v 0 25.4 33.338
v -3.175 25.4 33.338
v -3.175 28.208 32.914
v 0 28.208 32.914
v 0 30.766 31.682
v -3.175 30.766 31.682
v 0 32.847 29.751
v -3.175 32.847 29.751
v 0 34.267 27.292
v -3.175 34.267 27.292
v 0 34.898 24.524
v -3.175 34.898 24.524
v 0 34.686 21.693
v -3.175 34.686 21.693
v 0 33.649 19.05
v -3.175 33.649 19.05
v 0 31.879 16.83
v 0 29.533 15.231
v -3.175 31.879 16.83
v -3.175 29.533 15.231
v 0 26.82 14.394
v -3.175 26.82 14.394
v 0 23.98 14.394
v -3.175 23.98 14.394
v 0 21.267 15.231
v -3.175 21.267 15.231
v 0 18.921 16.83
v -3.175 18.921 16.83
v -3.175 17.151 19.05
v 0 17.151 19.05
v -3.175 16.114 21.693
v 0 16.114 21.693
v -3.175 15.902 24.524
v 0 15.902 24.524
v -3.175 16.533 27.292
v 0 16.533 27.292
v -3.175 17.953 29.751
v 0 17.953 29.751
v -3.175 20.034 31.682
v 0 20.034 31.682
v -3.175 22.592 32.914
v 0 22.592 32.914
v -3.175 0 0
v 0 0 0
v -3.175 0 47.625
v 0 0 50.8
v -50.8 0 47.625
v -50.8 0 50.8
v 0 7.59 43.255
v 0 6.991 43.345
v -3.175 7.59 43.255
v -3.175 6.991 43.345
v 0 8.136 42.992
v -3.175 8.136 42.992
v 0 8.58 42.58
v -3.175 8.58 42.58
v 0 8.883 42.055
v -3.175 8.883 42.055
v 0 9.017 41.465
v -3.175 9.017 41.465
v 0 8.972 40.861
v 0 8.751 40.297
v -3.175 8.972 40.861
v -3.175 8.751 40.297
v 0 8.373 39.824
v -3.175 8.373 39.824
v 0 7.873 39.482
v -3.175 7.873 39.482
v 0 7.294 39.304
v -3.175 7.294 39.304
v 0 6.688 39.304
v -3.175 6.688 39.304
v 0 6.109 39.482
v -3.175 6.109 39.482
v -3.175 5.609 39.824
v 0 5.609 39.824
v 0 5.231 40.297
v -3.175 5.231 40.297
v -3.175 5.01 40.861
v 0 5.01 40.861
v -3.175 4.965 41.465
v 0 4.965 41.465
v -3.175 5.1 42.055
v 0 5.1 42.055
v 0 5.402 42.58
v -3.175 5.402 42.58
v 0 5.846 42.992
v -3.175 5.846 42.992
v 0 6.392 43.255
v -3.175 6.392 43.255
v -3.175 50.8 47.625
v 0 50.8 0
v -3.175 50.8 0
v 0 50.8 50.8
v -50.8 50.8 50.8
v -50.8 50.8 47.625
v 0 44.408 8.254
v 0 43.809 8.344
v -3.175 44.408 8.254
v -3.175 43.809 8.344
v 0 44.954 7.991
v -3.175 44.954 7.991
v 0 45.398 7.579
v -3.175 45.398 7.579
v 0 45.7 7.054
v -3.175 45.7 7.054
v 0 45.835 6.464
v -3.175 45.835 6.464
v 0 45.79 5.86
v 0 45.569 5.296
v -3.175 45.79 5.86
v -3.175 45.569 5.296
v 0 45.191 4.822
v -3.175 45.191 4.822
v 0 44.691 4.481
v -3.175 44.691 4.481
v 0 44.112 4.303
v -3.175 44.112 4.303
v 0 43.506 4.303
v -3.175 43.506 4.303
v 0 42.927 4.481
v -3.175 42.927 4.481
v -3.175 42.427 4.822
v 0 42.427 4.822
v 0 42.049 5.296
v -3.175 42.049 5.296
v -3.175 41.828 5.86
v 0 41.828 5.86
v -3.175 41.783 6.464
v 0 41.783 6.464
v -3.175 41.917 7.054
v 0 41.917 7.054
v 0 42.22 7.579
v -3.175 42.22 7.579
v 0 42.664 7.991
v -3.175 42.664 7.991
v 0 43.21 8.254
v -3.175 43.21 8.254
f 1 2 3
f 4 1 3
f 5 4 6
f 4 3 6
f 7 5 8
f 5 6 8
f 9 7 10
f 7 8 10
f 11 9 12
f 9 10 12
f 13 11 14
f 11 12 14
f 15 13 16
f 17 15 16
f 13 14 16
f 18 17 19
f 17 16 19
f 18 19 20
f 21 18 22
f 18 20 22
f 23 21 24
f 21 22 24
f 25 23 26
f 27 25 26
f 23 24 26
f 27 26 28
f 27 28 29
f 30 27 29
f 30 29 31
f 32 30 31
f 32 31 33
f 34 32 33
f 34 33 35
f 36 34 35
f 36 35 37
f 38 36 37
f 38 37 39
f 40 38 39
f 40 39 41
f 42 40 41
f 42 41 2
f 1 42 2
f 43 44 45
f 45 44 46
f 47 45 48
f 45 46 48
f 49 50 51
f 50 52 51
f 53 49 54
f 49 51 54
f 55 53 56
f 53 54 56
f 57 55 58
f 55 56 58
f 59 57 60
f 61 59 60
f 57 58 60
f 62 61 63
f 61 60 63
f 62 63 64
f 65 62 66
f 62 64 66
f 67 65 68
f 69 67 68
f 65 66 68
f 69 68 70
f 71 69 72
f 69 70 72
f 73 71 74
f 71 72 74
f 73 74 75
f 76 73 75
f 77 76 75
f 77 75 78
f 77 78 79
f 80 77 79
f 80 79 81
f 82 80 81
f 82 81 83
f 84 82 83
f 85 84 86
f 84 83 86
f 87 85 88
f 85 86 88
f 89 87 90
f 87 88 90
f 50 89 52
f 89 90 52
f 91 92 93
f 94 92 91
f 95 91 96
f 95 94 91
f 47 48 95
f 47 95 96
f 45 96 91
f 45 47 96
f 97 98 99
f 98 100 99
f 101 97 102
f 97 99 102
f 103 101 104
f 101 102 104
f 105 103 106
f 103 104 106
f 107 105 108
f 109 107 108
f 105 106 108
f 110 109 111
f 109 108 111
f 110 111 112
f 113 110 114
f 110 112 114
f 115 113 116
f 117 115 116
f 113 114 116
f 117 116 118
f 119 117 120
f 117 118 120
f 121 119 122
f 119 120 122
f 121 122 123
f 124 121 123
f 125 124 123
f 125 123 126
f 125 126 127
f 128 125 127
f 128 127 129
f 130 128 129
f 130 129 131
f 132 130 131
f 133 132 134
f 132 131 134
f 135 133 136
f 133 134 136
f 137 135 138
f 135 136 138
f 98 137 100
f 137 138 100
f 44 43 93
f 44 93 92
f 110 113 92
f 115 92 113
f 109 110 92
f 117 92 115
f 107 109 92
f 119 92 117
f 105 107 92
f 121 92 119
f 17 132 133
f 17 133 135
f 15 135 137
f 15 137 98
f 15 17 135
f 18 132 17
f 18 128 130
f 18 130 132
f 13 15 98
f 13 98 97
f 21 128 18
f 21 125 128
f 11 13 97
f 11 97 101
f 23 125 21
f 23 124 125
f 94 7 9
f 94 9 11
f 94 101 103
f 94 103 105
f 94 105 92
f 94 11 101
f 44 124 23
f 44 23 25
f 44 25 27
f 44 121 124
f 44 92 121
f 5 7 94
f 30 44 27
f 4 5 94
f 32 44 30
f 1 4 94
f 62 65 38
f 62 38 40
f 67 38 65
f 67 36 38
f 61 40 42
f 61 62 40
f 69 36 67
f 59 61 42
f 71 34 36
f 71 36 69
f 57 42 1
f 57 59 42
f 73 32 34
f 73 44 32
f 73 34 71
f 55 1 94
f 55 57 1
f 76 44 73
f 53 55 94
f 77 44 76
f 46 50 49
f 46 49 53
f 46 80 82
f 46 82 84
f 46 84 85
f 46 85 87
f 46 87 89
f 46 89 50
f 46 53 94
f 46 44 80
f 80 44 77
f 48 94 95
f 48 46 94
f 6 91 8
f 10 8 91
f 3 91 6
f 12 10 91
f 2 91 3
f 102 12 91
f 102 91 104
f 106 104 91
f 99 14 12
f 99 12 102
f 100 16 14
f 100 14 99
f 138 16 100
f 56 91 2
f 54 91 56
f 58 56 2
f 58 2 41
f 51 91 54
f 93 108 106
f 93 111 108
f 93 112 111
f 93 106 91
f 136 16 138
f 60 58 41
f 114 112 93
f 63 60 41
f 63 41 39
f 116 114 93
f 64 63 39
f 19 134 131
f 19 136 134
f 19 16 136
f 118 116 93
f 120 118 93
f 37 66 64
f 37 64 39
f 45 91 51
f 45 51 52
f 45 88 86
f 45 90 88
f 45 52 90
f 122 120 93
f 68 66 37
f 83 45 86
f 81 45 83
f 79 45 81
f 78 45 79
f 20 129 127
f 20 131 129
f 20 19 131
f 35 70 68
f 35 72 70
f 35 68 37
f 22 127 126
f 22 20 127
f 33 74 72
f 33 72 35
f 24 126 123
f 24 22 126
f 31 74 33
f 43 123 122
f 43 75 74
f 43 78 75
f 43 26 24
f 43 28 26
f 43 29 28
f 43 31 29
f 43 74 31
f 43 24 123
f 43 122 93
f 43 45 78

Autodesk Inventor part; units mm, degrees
ref_plane "YZ Plane" through (0, 0, 0) normal (1, 0, 0) x (0, 1, 0)
ref_plane "XZ Plane" through (0, 0, 0) normal (0, 1, 0) x (-1, 0, 0)
ref_plane "XY Plane" through (0, 0, 0) normal (0, 0, 1) x (1, 0, 0)
sketch "Sketch1" plane through (0, 0, 0) normal (0, 1, 0) x (-1, 0, 0)
  line L0 (0, 0) -> (0, 50.8)
  line L1 (0, 50.8) -> (50.8, 50.8)
  line L2 (50.8, 50.8) -> (50.8, 47.625)
  line L3 (50.8, 47.625) -> (3.175, 47.625)
  line L4 (3.175, 47.625) -> (3.175, 0)
  line L5 (3.175, 0) -> (0, 0)
  dimension "d0" = 50.8
  dimension "d1" = 50.8
  dimension "d2" = 3.175
  dimension "d3" = 47.625
  dimension "d4" = 47.625
extrude "Extrusion1" add sketch "Sketch1" along normal blind 50.8
sketch "Sketch3" plane through (-3.175, 0, 0) normal (-1, 0, 0) x (0, 0, 1)
  circle A0 centre (23.8125, 25.4) radius 25.4 construction
  line L0 (0, 50.8) -> (47.625, 50.8) projected
  line L1 (0, 0) -> (0, 50.8) projected
  circle A1 centre (6.3119, 43.8089) radius 2.032
  circle A2 centre (41.3131, 6.9911) radius 2.032
  line L2 (0, 0) -> (50.8, 0) projected
  line L3 (23.8125, 0) -> (23.8125, 50.8) construction
  line L4 (50.8, 50.8) -> (0, 50.8) projected
  circle A3 centre (23.8125, 25.4) radius 9.525
  dimension "d12" = 50.8
  dimension "d13" = 25.4
  dimension "d14" = 23.8125
  dimension "d15" = 4.064
  dimension "d16" = 4.064
  dimension "d17" = 17.5006
  dimension "d18" = 17.5006
  dimension "d19" = 19.05
extrude "Extrusion2" cut sketch "Sketch3" against normal blind 3.175
properties part number "BAG motor bracket" material "Aluminum 6061"
